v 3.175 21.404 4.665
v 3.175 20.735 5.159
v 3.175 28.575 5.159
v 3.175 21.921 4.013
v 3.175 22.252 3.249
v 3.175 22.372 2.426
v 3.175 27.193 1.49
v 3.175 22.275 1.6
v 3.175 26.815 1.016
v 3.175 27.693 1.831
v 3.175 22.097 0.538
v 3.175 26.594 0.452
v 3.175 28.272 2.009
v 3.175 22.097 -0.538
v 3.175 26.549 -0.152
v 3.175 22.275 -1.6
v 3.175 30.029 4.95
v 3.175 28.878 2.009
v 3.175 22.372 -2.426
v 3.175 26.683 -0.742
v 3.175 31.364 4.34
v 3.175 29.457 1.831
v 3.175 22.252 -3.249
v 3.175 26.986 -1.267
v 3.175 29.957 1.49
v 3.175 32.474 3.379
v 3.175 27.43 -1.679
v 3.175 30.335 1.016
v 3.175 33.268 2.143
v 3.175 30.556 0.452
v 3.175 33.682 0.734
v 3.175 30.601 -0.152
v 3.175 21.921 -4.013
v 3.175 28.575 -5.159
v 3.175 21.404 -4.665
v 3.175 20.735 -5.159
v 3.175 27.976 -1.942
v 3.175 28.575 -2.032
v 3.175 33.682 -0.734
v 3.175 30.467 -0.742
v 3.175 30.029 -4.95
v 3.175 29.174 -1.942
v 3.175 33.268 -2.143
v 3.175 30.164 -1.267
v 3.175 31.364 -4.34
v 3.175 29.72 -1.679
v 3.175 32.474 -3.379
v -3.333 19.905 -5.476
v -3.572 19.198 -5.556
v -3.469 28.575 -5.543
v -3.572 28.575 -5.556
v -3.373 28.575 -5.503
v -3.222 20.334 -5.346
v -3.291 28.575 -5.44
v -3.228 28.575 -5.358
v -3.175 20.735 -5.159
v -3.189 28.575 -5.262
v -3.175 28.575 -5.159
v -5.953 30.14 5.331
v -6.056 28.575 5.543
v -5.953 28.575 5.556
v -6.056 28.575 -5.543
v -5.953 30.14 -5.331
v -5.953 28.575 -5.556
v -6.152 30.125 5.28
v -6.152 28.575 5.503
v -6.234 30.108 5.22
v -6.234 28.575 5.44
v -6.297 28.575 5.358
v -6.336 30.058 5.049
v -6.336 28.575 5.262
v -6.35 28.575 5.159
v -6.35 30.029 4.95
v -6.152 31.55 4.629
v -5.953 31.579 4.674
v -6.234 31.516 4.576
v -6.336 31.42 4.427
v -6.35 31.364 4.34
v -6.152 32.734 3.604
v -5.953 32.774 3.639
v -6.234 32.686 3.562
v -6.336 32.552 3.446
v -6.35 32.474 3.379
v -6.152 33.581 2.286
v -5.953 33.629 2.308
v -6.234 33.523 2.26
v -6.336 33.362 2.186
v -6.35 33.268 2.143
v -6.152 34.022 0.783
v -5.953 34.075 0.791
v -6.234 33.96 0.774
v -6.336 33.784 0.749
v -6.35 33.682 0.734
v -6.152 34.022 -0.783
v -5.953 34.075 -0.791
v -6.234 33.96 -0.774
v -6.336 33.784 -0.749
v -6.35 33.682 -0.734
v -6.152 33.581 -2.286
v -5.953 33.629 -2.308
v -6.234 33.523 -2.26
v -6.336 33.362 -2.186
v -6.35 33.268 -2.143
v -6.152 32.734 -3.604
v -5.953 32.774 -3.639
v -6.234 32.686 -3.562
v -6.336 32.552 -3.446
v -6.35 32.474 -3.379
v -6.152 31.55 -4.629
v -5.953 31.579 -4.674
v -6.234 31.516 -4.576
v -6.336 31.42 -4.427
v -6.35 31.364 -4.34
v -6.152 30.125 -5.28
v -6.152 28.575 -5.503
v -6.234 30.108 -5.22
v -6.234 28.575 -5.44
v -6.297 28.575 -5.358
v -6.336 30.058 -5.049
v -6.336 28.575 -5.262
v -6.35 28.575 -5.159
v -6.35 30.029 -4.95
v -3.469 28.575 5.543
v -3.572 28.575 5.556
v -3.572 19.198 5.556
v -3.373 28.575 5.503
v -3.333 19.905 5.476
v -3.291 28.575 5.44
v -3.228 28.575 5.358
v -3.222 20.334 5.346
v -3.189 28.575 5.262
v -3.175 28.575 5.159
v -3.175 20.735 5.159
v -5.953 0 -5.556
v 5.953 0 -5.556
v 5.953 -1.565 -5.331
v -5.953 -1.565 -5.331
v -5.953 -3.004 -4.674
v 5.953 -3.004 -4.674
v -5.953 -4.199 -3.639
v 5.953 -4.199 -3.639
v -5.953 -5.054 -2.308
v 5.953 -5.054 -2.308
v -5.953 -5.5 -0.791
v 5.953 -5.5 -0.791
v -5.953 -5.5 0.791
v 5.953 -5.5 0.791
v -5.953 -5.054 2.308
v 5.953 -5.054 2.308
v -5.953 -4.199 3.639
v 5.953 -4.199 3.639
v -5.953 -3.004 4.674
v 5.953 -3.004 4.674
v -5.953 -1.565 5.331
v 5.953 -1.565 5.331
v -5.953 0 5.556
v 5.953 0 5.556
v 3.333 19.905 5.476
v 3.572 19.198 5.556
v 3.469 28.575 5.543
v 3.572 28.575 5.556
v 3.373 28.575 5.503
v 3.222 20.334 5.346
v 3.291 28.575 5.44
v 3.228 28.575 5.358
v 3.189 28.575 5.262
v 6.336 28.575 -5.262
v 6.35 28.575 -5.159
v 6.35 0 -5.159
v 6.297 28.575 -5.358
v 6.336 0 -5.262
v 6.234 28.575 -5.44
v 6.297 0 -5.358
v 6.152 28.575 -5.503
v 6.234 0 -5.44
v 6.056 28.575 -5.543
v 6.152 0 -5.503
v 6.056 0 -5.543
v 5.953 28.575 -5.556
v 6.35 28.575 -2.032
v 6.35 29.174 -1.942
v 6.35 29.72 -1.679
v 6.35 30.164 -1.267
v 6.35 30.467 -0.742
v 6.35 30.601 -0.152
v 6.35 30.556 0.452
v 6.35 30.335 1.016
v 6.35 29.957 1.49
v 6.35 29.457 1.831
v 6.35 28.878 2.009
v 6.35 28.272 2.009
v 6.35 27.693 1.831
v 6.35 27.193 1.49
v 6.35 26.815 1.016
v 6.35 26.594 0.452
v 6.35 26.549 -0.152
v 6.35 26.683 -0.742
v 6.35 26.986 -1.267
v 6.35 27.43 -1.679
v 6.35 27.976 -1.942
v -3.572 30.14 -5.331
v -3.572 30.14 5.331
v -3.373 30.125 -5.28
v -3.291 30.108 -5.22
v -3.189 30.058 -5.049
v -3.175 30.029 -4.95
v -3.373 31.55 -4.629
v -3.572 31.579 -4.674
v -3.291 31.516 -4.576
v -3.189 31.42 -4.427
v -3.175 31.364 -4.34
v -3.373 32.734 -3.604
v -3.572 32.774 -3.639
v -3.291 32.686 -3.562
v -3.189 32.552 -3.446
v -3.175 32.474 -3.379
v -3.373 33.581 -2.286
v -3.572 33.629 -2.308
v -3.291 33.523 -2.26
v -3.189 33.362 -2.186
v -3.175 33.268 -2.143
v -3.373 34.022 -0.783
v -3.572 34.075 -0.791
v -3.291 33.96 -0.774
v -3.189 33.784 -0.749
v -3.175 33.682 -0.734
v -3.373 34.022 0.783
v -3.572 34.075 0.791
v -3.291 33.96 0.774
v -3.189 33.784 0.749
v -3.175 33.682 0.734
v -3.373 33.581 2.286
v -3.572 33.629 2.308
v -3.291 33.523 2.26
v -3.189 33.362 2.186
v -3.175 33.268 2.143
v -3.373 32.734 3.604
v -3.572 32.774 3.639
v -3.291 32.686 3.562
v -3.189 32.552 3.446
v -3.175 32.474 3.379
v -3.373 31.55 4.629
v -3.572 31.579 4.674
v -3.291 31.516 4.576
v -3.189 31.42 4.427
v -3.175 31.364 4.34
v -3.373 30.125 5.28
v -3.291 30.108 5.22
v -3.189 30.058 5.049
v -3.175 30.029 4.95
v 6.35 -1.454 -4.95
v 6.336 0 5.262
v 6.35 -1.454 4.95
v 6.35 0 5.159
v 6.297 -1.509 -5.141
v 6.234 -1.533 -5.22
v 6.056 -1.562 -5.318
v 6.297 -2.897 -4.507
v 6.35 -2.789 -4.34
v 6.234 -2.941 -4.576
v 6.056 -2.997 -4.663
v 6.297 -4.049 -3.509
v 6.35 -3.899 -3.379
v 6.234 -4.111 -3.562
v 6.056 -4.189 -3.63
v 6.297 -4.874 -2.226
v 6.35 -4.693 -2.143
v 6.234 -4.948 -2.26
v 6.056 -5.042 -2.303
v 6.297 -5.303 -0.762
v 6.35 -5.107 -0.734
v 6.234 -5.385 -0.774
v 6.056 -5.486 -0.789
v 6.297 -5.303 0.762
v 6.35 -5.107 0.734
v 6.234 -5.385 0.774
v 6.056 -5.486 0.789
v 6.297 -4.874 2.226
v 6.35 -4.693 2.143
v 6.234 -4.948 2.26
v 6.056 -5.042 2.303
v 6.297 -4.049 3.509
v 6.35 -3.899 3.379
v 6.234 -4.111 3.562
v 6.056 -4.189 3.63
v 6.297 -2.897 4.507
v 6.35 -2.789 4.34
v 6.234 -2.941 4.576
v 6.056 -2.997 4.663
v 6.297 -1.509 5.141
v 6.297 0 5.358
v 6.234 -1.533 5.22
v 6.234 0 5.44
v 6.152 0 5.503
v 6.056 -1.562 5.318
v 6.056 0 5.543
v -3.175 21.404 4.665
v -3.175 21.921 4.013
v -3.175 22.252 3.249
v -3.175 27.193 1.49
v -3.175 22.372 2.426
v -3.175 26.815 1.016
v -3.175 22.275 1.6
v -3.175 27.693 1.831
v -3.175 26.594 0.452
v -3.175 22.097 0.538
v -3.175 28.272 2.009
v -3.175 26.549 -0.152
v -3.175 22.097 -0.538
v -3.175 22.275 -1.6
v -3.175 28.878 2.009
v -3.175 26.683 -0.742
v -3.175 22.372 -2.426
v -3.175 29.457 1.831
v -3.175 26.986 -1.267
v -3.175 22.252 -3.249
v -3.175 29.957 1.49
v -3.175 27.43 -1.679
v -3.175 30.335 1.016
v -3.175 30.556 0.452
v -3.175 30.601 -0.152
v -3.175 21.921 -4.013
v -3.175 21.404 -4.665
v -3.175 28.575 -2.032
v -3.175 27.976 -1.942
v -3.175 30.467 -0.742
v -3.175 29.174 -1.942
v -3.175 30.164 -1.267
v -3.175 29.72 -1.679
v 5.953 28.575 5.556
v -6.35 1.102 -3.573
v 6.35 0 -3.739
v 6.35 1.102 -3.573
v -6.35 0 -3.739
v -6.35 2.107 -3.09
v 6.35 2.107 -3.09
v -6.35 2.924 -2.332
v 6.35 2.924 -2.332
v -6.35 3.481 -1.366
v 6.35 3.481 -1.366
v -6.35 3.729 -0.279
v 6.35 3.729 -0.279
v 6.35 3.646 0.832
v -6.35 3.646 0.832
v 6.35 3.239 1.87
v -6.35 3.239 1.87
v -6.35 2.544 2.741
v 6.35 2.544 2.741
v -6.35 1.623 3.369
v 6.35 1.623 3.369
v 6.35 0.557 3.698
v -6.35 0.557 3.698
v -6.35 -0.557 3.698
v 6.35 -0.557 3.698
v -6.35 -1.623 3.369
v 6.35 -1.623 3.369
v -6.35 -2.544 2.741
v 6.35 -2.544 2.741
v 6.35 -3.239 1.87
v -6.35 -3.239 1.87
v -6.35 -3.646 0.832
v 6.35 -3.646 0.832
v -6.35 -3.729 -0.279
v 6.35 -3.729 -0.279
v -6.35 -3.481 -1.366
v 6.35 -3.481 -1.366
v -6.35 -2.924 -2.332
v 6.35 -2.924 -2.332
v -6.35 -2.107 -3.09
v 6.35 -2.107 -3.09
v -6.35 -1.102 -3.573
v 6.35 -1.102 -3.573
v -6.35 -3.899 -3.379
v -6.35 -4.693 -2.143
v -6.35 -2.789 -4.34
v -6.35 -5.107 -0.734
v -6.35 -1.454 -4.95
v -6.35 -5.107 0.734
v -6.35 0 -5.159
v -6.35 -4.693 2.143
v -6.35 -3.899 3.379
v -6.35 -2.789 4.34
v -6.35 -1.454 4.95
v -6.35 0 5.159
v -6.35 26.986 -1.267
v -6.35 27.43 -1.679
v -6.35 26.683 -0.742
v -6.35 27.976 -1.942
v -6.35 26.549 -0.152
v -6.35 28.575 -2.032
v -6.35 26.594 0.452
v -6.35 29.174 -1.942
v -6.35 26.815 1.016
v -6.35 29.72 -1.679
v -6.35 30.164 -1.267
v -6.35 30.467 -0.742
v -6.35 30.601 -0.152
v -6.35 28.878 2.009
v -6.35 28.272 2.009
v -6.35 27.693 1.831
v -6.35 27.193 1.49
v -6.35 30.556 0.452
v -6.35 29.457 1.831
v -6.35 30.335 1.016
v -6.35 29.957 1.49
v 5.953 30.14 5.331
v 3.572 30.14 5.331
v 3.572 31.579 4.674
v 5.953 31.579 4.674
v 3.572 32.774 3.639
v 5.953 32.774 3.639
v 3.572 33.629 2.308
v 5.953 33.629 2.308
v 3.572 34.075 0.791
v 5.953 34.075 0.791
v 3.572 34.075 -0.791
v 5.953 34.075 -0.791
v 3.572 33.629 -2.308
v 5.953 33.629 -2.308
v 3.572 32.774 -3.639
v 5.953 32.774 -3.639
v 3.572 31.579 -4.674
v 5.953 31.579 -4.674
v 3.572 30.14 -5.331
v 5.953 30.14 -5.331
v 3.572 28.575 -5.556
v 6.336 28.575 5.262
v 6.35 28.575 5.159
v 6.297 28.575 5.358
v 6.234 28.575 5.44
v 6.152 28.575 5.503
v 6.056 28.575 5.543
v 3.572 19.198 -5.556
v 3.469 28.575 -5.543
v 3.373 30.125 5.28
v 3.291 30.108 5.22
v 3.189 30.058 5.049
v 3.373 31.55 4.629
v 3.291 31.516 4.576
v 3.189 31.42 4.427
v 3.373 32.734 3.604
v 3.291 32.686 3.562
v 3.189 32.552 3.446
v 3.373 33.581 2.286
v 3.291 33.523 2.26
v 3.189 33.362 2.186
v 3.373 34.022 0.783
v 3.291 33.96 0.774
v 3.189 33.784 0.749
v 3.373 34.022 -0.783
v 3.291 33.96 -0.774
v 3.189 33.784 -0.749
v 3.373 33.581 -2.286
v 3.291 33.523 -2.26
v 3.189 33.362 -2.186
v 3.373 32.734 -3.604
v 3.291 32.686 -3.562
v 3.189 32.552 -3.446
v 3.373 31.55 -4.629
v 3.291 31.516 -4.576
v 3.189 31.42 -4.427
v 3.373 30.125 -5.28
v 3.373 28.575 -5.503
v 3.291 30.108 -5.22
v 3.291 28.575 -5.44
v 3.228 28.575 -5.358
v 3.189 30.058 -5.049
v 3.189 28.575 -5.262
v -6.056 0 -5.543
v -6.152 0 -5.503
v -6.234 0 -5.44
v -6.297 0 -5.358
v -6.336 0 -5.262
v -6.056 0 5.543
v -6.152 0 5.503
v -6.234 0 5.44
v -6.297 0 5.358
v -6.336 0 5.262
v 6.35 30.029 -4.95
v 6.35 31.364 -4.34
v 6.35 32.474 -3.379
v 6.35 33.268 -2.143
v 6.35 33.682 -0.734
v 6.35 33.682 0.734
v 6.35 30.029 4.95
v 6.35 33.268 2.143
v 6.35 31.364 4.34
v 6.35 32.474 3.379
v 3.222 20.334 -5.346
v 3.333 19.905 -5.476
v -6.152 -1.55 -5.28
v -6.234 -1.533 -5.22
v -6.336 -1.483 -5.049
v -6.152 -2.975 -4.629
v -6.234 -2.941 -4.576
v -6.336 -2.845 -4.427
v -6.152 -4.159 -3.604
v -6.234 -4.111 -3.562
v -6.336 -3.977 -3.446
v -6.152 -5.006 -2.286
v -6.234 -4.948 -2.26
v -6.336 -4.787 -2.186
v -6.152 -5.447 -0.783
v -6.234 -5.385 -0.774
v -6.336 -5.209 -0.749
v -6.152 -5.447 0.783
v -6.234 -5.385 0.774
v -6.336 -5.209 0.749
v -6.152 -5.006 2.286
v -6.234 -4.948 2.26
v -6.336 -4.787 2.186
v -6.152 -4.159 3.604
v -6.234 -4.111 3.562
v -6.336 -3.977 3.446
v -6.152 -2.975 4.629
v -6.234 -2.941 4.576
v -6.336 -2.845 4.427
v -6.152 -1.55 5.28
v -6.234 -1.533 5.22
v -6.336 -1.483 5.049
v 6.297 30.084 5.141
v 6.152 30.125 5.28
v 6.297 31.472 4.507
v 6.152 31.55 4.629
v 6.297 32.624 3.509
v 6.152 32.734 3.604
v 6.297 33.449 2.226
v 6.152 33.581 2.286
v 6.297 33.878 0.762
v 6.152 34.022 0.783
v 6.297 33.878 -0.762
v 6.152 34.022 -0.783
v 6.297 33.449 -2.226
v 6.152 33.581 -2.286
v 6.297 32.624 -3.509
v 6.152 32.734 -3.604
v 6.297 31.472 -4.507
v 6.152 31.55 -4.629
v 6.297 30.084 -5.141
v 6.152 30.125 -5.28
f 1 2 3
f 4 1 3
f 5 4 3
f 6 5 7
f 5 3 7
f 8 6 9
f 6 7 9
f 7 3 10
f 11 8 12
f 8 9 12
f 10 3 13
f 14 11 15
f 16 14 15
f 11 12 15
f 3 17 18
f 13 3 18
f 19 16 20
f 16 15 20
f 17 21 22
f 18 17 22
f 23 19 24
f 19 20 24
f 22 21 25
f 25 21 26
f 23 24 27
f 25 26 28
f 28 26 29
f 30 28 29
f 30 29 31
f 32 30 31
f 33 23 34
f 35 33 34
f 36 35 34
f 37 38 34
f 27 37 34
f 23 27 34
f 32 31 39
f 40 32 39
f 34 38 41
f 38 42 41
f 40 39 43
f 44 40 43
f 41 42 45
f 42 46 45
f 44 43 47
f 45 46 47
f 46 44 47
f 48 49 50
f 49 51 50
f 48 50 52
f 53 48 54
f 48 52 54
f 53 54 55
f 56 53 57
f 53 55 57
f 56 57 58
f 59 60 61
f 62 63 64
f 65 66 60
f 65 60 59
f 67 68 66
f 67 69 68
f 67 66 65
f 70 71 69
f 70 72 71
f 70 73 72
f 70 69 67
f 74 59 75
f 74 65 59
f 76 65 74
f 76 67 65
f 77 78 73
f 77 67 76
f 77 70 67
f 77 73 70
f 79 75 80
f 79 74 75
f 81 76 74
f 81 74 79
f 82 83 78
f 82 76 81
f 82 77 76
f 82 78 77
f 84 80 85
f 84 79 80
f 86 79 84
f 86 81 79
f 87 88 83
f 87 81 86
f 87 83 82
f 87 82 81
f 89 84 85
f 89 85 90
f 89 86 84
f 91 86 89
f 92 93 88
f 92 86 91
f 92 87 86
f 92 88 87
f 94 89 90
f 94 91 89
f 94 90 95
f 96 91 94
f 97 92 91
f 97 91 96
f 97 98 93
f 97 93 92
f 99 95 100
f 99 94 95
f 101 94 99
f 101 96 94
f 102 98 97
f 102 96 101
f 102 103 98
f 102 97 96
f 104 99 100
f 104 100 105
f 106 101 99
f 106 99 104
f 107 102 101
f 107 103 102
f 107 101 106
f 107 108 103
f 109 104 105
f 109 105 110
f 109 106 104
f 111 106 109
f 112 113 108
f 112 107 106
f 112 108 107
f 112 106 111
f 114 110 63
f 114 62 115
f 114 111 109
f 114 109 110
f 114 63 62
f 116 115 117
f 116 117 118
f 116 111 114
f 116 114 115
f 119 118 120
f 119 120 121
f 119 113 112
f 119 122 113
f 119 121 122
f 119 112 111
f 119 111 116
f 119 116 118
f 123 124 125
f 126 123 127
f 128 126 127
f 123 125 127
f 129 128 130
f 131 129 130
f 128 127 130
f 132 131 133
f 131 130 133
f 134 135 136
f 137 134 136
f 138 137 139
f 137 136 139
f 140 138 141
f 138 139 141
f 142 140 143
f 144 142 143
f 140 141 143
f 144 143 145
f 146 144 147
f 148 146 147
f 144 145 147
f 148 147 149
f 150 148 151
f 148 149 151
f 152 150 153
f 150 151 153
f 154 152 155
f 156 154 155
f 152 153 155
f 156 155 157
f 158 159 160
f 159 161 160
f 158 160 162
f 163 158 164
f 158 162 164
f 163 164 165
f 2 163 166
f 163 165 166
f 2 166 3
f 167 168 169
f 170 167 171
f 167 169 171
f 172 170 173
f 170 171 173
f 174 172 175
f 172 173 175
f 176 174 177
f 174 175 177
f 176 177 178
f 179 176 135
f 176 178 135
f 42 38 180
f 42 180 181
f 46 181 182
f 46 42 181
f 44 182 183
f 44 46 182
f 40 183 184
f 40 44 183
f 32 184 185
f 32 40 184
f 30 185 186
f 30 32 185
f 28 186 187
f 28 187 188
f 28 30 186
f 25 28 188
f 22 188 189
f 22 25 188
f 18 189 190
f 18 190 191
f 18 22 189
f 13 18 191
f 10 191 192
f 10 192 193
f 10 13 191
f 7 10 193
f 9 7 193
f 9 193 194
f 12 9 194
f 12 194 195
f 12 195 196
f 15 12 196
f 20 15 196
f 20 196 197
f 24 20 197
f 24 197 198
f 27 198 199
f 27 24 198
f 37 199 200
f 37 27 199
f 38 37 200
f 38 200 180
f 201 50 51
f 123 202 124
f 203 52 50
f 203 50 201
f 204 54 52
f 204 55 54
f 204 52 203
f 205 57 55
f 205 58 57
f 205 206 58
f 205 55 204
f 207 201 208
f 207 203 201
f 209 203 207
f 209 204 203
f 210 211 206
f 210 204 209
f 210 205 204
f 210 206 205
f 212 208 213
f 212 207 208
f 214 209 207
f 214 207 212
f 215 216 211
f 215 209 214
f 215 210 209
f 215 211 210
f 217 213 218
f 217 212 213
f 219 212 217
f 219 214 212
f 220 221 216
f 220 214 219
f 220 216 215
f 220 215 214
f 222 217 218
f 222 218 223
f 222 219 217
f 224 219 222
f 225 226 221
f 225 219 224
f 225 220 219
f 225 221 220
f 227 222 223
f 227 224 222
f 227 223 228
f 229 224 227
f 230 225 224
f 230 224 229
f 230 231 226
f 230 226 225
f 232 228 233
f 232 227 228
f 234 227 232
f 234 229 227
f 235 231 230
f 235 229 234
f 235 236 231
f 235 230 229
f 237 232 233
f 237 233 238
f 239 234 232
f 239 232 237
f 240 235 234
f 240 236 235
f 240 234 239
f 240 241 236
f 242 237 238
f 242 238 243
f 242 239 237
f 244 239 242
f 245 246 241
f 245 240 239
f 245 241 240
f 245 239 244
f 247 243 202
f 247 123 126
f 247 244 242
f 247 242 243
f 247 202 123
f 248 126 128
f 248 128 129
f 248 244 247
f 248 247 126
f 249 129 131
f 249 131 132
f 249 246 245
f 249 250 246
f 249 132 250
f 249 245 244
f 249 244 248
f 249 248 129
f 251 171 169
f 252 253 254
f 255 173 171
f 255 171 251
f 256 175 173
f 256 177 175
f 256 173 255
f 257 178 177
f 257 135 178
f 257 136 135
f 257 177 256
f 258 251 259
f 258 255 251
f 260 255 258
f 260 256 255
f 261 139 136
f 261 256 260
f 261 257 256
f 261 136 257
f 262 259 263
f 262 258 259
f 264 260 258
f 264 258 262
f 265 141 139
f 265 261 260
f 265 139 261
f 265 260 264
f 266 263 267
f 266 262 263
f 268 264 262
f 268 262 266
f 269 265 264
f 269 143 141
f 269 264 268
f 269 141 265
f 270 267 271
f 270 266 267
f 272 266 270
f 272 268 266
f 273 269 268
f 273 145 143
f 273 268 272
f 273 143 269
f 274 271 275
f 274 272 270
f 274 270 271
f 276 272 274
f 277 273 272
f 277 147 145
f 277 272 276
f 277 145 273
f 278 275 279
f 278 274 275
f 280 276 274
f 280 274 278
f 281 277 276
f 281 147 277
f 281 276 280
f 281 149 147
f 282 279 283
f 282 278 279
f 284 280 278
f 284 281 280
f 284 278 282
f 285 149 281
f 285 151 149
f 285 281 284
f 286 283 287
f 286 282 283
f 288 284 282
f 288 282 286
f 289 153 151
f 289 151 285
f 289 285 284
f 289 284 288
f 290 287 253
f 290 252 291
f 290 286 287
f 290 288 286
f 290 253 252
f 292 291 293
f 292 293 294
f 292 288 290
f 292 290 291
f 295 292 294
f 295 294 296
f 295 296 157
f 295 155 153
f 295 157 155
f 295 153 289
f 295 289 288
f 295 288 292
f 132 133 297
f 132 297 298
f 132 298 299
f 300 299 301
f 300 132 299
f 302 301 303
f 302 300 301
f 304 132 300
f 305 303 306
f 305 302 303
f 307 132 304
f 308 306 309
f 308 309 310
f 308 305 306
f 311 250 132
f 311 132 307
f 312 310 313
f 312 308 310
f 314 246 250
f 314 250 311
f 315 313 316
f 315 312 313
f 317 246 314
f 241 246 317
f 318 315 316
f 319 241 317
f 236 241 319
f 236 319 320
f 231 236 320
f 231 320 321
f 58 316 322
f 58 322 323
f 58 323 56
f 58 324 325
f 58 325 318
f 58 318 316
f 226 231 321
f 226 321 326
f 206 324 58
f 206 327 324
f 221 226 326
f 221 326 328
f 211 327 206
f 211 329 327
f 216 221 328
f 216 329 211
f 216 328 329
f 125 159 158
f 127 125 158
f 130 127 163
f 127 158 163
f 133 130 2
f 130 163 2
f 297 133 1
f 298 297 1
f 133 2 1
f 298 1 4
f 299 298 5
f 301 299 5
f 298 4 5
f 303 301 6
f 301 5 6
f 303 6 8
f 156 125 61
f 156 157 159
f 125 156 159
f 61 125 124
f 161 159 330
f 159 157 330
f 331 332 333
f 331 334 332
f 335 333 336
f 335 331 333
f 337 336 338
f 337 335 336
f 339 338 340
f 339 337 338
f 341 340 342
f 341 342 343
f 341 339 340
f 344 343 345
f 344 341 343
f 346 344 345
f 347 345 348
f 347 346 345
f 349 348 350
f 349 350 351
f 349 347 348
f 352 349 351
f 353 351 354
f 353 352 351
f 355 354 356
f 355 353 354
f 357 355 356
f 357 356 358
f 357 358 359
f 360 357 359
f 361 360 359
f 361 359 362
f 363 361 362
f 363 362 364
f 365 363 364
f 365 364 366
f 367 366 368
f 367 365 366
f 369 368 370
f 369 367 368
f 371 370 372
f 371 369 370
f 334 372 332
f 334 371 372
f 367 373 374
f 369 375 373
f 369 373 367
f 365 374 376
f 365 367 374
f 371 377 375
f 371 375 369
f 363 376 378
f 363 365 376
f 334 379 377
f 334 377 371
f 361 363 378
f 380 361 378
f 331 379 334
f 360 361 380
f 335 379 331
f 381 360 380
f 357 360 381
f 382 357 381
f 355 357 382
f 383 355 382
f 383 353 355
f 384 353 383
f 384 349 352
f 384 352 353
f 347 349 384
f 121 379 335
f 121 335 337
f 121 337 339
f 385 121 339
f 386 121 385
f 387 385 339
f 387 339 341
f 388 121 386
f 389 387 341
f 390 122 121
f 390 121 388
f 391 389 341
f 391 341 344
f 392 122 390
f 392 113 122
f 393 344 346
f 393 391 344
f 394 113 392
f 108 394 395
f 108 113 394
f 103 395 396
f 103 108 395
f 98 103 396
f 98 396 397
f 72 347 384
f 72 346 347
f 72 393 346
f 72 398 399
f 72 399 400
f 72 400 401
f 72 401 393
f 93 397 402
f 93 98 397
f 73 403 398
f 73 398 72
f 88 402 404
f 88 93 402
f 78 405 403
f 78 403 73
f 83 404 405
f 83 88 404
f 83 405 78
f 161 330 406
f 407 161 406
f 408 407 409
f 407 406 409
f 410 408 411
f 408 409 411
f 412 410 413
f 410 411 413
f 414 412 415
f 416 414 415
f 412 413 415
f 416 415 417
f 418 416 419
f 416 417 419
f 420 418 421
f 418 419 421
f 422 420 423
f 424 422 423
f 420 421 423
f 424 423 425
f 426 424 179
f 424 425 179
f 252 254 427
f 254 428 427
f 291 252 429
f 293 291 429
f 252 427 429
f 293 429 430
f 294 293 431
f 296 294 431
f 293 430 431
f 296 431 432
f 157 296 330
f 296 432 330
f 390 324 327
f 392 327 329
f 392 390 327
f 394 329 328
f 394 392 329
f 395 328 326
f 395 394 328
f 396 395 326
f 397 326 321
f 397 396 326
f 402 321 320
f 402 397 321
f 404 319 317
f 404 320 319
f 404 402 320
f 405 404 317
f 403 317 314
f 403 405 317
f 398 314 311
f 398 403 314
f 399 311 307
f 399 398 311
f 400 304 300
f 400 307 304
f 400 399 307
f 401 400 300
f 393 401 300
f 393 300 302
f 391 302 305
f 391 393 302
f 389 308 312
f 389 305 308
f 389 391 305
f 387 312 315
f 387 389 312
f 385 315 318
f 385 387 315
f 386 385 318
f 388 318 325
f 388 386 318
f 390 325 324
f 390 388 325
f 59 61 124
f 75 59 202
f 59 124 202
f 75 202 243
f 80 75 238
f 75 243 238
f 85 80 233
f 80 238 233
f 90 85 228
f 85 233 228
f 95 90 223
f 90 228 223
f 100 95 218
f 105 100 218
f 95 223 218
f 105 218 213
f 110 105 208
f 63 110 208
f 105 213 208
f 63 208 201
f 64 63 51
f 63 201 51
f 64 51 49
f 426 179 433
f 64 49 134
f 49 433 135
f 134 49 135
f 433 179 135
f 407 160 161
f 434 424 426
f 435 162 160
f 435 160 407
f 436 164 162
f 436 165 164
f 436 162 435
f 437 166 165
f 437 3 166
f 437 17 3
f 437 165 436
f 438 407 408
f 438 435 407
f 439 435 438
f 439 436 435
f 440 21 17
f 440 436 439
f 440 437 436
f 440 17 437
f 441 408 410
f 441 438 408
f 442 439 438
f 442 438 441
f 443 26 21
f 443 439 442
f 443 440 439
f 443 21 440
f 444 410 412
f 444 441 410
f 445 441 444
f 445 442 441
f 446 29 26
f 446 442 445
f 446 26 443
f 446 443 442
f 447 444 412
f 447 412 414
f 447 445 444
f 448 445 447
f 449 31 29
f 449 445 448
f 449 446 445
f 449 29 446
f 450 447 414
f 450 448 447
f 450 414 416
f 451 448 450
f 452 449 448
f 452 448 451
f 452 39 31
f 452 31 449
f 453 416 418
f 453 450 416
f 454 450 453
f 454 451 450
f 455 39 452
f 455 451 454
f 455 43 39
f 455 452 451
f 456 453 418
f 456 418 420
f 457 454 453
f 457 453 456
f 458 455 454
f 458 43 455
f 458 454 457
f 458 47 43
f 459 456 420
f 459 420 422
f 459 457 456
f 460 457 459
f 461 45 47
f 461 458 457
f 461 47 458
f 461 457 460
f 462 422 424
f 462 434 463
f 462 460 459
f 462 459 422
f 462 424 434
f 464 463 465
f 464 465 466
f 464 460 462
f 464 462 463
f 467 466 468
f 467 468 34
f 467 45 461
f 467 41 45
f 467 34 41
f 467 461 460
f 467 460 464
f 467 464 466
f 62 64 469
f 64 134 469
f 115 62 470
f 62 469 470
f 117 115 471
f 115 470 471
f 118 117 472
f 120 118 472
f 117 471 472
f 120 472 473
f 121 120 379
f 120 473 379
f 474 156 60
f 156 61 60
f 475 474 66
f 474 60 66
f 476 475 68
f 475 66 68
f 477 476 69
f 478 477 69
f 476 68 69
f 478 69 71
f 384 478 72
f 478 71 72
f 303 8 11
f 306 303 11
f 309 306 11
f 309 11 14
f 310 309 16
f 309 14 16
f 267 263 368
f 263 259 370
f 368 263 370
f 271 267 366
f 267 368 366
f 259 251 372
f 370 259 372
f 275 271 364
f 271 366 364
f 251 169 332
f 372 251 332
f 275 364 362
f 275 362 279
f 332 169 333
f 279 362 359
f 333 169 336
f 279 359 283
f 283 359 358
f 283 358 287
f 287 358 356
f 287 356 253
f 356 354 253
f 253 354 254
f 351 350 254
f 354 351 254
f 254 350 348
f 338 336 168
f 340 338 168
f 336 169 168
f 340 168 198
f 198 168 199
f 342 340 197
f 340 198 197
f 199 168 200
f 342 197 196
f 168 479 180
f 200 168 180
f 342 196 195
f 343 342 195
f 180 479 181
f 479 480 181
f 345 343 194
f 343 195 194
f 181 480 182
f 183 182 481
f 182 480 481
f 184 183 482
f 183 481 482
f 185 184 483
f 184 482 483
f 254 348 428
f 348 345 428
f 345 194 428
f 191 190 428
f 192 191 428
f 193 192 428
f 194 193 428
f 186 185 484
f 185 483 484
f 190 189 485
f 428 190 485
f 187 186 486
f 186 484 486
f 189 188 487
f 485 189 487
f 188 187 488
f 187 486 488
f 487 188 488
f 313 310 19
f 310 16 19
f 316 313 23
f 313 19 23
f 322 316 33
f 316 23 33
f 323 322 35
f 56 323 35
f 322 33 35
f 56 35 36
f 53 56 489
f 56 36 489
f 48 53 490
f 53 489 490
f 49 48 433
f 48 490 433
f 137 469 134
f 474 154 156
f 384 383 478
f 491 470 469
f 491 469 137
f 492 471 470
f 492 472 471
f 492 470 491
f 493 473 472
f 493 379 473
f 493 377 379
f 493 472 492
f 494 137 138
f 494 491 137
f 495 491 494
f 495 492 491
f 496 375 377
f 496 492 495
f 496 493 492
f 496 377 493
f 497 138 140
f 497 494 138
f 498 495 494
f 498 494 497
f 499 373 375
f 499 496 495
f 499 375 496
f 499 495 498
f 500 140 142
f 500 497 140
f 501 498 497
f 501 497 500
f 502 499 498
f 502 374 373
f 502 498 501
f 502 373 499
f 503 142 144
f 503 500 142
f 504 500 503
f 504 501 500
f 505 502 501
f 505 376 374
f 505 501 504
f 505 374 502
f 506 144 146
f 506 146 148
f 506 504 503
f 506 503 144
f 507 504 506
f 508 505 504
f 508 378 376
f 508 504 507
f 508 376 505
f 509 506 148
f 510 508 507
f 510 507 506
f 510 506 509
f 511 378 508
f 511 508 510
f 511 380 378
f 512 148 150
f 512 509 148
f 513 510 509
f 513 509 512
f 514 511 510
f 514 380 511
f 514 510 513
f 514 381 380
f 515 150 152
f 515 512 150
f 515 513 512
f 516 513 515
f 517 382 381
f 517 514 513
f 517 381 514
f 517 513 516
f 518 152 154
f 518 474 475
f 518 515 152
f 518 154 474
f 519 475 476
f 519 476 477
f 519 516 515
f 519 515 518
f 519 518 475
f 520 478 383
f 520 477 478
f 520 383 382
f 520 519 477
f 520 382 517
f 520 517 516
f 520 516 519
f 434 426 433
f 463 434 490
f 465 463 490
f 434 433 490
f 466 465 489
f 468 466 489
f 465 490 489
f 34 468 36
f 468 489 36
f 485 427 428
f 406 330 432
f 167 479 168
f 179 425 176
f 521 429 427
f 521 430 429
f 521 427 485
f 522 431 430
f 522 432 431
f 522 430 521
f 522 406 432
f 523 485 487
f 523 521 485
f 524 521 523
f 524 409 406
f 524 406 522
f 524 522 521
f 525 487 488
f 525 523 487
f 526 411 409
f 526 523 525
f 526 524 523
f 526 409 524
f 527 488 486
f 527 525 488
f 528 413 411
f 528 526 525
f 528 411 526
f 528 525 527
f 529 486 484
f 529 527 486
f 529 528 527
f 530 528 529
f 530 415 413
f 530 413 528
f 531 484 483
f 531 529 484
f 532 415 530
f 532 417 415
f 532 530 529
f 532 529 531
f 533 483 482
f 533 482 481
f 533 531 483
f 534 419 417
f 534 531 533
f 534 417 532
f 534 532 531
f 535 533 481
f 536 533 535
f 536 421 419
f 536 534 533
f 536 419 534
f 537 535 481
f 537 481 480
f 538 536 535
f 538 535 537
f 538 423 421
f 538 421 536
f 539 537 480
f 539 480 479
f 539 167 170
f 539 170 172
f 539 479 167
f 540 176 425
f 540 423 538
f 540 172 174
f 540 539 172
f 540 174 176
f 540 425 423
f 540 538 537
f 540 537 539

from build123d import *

# Parameters (mm, degrees)
SKETCH1_R           = 3.739497694
SKETCH1_R_2         = 2.032
BOSS_EXTRUDE1_DEPTH = 6.35
SKETCH2_R           = 6.5
CUT_EXTRUDE1_DEPTH  = 3.175
FILLET1_R           = 3.175
FILLET2_R           = 0.396875


with BuildPart() as part:
    # Sketch1 → Boss-Extrude1 (new, symmetric)
    with BuildSketch(Plane(origin=(0, 0, 0), x_dir=(0, 0, -1), z_dir=(1, 0, 0))):
        with BuildLine():
            Line((-5.55625, 0), (-5.55625, 28.575))
            ThreePointArc((-5.55625, 28.575), (0, 34.13125), (5.55625, 28.575))
            Line((5.55625, 28.575), (5.55625, 0))
            ThreePointArc((5.55625, 0), (0, -5.55625), (-5.55625, 0))
        make_face()
        Circle(SKETCH1_R, mode=Mode.SUBTRACT)
        with Locations((0, 28.575)):
            Circle(SKETCH1_R_2, mode=Mode.SUBTRACT)
    extrude(amount=BOSS_EXTRUDE1_DEPTH, both=True)

    # Sketch2 → Cut-Extrude1 (cut, symmetric)
    with BuildSketch(Plane(origin=(0, 0, 0), x_dir=(0, 0, -1), z_dir=(1, 0, 0))):
        with Locations((0, 28.575)):
            Circle(SKETCH2_R)
    extrude(amount=CUT_EXTRUDE1_DEPTH, both=True, mode=Mode.SUBTRACT)

    # Fillet1
    fillet1_edges = [part.edges().sort_by_distance(p)[0] for p in [
        (0, 25.20185815, 5.55625),
        (0, 25.20185815, -5.55625),
    ]]
    fillet(fillet1_edges, radius=FILLET1_R)

    # Fillet2
    fillet2_edges = [part.edges().sort_by_distance(p)[0] for p in [
        (6.35, 34.13125, 0),
        (6.35, 14.2875, 5.55625),
        (3.175, 23.886309526, -5.55625),
        (3.175, 34.13125, 0),
        (3.175, 23.886309526, 5.55625),
        (-3.175, 23.886309526, -5.55625),
        (-3.175, 34.13125, 0),
        (-3.175, 23.886309526, 5.55625),
        (6.35, -5.55625, 0),
        (-6.35, 14.2875, 5.55625),
        (-6.35, 34.13125, 0),
        (-6.35, 14.2875, -5.55625),
        (-6.35, -5.55625, 0),
        (6.35, 14.2875, -5.55625),
    ]]
    fillet(fillet2_edges, radius=FILLET2_R)


solid = part.part
